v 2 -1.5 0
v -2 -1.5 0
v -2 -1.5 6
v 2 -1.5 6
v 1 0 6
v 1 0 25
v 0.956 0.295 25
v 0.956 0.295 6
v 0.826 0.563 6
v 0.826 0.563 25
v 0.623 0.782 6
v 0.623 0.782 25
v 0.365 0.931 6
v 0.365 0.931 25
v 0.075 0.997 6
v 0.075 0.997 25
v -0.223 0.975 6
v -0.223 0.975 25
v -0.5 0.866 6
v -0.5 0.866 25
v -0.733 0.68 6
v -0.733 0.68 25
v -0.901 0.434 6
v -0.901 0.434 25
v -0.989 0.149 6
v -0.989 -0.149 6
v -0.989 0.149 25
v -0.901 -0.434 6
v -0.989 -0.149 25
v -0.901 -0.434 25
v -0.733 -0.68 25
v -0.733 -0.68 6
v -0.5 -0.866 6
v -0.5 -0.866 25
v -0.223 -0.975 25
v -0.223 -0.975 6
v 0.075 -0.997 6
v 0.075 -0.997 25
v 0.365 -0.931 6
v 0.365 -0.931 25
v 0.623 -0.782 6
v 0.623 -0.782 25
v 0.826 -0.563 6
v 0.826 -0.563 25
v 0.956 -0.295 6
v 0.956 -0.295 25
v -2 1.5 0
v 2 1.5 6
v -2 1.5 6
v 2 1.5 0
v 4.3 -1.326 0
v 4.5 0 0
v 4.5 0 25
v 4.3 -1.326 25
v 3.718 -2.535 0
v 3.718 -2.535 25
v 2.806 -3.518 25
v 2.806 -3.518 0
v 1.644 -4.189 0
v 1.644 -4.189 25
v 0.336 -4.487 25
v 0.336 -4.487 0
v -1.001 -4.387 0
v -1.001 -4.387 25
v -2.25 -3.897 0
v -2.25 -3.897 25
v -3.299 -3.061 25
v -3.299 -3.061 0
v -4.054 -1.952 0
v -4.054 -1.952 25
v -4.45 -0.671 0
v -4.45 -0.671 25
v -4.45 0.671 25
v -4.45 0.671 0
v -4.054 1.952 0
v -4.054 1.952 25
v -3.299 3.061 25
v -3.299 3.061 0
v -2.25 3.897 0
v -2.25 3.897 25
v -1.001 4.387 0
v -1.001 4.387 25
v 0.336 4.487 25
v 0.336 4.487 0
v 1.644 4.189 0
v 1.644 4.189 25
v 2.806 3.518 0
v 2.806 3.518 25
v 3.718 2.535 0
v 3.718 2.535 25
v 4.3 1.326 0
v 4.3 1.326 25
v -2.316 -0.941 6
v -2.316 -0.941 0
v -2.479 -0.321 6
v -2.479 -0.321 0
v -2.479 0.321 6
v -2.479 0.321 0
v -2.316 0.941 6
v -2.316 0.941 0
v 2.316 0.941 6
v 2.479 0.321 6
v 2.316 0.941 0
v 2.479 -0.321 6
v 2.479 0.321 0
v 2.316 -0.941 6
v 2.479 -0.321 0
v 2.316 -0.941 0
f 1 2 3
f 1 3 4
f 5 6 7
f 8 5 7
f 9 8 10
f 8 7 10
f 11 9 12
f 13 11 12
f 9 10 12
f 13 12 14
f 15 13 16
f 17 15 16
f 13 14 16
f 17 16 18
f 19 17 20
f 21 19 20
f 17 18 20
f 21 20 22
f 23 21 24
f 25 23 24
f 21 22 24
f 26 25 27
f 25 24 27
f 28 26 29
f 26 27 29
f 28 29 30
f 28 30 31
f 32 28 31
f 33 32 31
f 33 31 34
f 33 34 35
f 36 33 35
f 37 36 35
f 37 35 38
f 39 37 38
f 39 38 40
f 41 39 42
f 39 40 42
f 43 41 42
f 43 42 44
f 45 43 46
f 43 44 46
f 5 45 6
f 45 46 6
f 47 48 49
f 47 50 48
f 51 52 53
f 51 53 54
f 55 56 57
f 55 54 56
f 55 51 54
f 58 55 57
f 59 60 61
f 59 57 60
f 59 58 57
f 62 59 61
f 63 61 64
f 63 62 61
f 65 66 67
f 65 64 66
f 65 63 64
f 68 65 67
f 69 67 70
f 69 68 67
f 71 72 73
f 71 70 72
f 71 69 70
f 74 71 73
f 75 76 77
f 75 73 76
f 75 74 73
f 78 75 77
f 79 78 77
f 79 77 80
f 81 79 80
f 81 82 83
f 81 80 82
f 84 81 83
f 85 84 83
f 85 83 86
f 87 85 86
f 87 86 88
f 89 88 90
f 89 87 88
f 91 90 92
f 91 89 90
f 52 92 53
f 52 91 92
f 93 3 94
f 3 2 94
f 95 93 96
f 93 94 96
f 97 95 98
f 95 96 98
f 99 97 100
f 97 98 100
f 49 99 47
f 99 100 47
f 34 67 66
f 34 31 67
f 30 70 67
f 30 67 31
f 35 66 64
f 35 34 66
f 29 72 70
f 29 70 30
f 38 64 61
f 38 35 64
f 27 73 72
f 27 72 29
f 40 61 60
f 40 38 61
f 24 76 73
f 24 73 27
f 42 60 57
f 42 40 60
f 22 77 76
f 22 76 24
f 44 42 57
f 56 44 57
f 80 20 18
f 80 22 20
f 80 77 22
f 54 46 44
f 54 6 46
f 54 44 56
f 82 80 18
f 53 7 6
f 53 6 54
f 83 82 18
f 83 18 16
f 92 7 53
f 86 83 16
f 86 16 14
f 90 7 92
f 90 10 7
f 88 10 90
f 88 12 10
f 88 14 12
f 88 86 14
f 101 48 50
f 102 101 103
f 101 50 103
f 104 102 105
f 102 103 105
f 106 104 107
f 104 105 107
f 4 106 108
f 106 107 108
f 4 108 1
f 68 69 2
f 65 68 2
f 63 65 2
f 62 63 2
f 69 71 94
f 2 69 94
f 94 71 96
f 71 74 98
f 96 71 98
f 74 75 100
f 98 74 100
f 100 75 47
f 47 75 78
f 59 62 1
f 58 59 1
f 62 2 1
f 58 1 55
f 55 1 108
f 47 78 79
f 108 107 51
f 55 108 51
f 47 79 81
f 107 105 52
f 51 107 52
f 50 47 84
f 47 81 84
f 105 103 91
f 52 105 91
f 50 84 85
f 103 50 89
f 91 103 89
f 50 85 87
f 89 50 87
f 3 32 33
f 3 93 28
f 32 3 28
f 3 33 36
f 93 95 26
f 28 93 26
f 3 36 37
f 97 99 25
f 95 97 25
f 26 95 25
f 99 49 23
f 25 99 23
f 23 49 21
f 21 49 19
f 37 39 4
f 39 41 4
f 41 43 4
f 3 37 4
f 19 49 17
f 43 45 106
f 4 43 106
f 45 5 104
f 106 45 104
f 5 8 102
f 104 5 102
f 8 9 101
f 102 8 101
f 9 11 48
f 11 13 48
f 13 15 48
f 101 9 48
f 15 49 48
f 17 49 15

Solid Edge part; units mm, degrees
sketch "Sketch1" plane through (0, 0, 0) normal (0, 0, 1) x (1, 0, 0)
  circle A0 centre (0, 0) radius 4.5
extrude "Protrusion1" add sketch "Sketch1" along normal blind 25
sketch "Sketch2" plane through (0, 0, 0) normal (0, 0, -1) x (1, 0, 0)
  line L0 (2, -1.5) -> (-2, -1.5)
  line L1 (-2, 1.5) -> (2, 1.5)
  arc A0 (2, 1.5) -> (2, -1.5) centre (0, 0) cw
  arc A1 (-2, -1.5) -> (-2, 1.5) centre (0, 0) cw
extrude "ExtrudedCutout_1" cut sketch "Sketch2" against normal blind 6 and the other way blind 2.1211
sketch "Sketch3" plane through (0, 0, 25) normal (0, 0, 1) x (1, 0, 0)
  circle A0 centre (0, 0) radius 1
extrude "ExtrudedCutout_2" cut sketch "Sketch3" against normal blind 37.6627 and the other way blind 30.582
